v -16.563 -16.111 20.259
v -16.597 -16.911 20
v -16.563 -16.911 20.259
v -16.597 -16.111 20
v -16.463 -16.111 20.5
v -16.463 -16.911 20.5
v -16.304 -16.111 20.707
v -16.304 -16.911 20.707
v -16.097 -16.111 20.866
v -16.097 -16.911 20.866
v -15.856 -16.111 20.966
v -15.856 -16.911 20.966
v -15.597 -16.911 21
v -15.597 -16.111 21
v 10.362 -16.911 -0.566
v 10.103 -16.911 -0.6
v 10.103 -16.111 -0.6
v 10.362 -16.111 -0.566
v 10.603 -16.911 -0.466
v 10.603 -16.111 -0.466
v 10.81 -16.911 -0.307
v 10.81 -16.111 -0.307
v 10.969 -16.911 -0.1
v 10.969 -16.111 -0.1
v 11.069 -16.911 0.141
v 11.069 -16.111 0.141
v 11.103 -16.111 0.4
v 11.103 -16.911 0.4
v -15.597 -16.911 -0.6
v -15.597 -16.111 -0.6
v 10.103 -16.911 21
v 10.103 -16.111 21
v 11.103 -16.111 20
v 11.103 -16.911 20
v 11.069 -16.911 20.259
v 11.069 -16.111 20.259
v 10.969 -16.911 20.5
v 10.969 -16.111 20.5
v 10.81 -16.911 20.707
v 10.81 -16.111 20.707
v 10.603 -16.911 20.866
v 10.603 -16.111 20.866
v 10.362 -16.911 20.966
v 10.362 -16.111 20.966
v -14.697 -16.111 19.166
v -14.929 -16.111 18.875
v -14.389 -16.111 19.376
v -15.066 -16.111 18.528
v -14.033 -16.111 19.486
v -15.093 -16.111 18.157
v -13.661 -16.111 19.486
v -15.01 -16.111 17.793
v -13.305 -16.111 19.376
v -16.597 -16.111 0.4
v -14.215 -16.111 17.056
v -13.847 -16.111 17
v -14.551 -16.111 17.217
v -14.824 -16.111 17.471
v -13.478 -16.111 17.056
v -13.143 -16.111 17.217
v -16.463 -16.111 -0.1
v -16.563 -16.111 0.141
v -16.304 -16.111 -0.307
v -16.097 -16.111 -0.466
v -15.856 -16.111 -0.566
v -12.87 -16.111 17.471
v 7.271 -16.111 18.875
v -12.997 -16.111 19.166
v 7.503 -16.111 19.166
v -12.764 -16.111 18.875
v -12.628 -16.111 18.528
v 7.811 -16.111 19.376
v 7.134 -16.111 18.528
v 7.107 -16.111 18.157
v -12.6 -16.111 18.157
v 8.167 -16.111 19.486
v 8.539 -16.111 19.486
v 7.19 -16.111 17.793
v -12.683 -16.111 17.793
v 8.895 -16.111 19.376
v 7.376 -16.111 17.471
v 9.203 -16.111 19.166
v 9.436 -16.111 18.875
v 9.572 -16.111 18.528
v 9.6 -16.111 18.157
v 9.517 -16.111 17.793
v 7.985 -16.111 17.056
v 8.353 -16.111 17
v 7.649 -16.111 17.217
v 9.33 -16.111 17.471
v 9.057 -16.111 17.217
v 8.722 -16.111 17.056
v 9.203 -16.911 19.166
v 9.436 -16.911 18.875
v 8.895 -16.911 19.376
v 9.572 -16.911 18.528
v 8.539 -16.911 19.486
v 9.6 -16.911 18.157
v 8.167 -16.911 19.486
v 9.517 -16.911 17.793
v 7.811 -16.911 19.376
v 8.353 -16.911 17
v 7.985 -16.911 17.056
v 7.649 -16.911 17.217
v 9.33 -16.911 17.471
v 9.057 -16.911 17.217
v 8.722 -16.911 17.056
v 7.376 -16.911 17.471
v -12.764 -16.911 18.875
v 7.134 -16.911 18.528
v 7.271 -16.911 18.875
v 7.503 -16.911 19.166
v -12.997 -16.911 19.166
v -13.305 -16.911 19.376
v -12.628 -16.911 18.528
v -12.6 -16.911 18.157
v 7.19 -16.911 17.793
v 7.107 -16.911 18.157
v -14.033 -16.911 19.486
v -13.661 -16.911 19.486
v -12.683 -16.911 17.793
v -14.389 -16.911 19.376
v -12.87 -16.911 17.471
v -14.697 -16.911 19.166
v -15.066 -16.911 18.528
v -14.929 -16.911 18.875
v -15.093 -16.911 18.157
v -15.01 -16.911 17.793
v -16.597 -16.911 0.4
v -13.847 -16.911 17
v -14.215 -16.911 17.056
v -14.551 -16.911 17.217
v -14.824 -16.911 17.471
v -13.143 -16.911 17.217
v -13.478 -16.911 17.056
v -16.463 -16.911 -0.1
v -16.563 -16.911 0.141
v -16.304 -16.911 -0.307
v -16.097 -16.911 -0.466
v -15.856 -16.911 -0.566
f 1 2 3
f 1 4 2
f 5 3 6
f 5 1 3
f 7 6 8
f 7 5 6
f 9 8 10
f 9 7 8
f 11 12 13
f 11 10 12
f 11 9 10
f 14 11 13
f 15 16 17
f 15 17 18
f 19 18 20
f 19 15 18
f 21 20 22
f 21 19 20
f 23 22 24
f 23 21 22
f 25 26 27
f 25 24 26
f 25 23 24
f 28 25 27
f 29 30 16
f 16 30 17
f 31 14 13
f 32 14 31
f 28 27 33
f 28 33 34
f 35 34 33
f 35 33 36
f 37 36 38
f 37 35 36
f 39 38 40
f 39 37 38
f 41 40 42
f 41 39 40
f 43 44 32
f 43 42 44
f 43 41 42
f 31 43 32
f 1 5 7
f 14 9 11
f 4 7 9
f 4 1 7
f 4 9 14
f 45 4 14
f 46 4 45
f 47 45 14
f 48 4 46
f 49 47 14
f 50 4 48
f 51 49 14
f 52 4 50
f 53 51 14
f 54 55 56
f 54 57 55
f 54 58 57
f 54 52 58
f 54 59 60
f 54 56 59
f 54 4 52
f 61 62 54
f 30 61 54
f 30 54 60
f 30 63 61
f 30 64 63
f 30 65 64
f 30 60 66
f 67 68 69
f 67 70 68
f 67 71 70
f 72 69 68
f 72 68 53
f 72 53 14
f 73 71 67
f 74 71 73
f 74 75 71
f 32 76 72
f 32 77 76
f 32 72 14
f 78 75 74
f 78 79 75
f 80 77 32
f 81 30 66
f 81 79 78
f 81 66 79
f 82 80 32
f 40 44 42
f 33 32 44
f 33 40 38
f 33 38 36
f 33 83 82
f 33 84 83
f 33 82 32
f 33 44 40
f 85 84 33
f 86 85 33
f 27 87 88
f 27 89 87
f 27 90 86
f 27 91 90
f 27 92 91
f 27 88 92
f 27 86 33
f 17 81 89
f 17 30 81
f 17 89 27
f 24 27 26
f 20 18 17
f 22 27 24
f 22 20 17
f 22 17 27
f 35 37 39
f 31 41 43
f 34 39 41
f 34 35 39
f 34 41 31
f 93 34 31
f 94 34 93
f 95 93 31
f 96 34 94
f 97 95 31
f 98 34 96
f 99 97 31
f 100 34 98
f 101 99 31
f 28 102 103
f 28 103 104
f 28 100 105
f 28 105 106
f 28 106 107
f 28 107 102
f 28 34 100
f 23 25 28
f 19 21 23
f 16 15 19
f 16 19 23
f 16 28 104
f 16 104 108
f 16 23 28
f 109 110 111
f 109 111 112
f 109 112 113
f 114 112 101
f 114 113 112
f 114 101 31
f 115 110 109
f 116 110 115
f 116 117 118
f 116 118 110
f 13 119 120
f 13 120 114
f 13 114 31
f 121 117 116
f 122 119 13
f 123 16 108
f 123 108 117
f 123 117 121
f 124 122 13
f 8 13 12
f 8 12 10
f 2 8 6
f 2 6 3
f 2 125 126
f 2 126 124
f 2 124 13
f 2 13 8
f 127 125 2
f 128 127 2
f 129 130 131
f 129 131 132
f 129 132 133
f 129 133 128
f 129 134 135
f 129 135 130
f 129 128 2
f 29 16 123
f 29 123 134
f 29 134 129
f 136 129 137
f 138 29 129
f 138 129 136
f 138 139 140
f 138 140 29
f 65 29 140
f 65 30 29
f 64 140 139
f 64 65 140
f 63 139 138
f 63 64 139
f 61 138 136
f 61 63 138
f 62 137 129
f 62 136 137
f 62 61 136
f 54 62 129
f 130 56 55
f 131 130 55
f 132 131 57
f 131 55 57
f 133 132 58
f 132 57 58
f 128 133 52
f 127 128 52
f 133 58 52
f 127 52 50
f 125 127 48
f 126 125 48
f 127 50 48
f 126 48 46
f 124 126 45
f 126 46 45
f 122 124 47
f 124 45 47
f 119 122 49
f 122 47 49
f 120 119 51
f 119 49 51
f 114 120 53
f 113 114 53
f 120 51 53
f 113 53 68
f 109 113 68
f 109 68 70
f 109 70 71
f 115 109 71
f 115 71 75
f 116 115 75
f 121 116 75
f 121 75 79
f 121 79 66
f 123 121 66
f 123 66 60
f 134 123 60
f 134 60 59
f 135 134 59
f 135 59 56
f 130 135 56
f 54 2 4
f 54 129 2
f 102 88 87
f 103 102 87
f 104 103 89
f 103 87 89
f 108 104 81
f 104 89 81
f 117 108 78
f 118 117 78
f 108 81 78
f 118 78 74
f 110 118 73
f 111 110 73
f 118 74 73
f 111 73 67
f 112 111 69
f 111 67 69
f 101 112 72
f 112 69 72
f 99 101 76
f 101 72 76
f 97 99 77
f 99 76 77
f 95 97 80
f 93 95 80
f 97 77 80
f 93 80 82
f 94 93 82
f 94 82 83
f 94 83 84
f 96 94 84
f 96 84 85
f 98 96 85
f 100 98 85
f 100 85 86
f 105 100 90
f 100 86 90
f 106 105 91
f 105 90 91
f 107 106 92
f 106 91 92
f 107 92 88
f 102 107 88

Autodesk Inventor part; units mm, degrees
ref_plane "YZ Plane" through (0, 0, 0) normal (1, 0, 0) x (0, 1, 0)
ref_plane "XZ Plane" through (0, 0, 0) normal (0, 1, 0) x (-1, 0, 0)
ref_plane "Work Plane1" through (0.75, 1.7337, 0.1) normal (0, 0, 1) x (1, 0, 0)
sketch "Sketch1" plane through (0.75, 1.7337, 0.1) normal (0, 0, 1) x (1, 0, 0)
  line L0 (14.9531, -9.2968) -> (14.9531, -22.3927) projected
  line L1 (14.9531, -9.2968) -> (11.1531, -9.2968) projected
  line L2 (-21.9469, -8.1274) -> (-21.9469, -20.8182) projected
  line L3 (-21.9469, -20.8182) -> (-17.7469, -20.8182) projected
  line L4 (10.3531, -18.6448) -> (-17.3469, -18.6448)
  line L5 (-17.3469, -18.6448) -> (-17.3469, -17.8448)
  line L6 (-17.3469, -17.8448) -> (10.3531, -17.8448)
  line L7 (10.3531, -17.8448) -> (10.3531, -18.6448)
  line L8 (14.9531, -22.3927) -> (10.7531, -22.3927) projected
  circle A0 centre (12.7531, -12.5861) radius 2 projected
  circle A1 centre (12.7531, -12.5861) radius 2 projected
  circle A2 centre (12.7531, -19.134) radius 2 projected
  circle A3 centre (12.7531, -19.134) radius 2 projected
  line L9 (11.1531, -10.0071) -> (11.1531, -9.2968) projected
  line L10 (11.1531, -10.0071) -> (10.7531, -10.0071) projected
  line L11 (10.7531, -12.5861) -> (10.7531, -10.0071) projected
  line L12 (10.7531, -19.134) -> (10.7531, -12.5861) projected
  line L13 (10.7531, -22.3927) -> (10.7531, -19.134) projected
  line L14 (-17.7469, -8.1274) -> (-17.7469, -20.8182) projected
  line L15 (-21.9469, -8.1274) -> (-17.7469, -8.1274) projected
  ellipse E0 centre (-19.8469, -17.6455) end of major axis (-21.8469, -17.6455) minor radius 1.9381 projected
  ellipse E1 centre (-19.8469, -11.3001) end of major axis (-21.8469, -11.3001) minor radius 1.9381 projected
  point P0 (-0.75, -1.7337)
  point P1 (-18.5469, -9.3259)
  dimension "d2" = 0.8
extrude "Extrusion1" add sketch "Sketch1" along normal blind 20.9 and the other way blind 0.7 contours L4 L5 L6 L7
sketch "Sketch3" plane through (-16.5969, -16.911, -0.6) normal (0, -1, 0) x (1, 0, 0)
  line L0 (27.7, 0) -> (0, 0) projected
  line L1 (27.7, 0) -> (27.7, 21.6) projected
  line L2 (0, 21.6) -> (27.7, 21.6) projected
  line L3 (0, 0) -> (0, 21.6) projected
  circle A0 centre (24.95, 18.85) radius 2.75
  circle A1 centre (2.75, 18.85) radius 2.75
  line L4 (27.7, 21.6) -> (27.7, 0)
  line L5 (0, 0) -> (0, 21.6)
  point P0 (16.5969, 0.6)
  dimension "d17" = 5.5
  dimension "d18" = 5.5
  dimension "d19" = 0
  dimension "d20" = 0
hole "Hole1" at (8.3531, -16.911, 18.25) at (-13.8469, -16.911, 18.25) direction (0, 1, 0) diameter 2.5 end through all
fillet "Fillet1" radius 1 4 edges at (11.1031, -16.511, -0.6) (-16.5969, -16.511, -0.6) (-16.5969, -16.511, 21) (11.1031, -16.511, 21)
properties part number "PCB_Controller"
